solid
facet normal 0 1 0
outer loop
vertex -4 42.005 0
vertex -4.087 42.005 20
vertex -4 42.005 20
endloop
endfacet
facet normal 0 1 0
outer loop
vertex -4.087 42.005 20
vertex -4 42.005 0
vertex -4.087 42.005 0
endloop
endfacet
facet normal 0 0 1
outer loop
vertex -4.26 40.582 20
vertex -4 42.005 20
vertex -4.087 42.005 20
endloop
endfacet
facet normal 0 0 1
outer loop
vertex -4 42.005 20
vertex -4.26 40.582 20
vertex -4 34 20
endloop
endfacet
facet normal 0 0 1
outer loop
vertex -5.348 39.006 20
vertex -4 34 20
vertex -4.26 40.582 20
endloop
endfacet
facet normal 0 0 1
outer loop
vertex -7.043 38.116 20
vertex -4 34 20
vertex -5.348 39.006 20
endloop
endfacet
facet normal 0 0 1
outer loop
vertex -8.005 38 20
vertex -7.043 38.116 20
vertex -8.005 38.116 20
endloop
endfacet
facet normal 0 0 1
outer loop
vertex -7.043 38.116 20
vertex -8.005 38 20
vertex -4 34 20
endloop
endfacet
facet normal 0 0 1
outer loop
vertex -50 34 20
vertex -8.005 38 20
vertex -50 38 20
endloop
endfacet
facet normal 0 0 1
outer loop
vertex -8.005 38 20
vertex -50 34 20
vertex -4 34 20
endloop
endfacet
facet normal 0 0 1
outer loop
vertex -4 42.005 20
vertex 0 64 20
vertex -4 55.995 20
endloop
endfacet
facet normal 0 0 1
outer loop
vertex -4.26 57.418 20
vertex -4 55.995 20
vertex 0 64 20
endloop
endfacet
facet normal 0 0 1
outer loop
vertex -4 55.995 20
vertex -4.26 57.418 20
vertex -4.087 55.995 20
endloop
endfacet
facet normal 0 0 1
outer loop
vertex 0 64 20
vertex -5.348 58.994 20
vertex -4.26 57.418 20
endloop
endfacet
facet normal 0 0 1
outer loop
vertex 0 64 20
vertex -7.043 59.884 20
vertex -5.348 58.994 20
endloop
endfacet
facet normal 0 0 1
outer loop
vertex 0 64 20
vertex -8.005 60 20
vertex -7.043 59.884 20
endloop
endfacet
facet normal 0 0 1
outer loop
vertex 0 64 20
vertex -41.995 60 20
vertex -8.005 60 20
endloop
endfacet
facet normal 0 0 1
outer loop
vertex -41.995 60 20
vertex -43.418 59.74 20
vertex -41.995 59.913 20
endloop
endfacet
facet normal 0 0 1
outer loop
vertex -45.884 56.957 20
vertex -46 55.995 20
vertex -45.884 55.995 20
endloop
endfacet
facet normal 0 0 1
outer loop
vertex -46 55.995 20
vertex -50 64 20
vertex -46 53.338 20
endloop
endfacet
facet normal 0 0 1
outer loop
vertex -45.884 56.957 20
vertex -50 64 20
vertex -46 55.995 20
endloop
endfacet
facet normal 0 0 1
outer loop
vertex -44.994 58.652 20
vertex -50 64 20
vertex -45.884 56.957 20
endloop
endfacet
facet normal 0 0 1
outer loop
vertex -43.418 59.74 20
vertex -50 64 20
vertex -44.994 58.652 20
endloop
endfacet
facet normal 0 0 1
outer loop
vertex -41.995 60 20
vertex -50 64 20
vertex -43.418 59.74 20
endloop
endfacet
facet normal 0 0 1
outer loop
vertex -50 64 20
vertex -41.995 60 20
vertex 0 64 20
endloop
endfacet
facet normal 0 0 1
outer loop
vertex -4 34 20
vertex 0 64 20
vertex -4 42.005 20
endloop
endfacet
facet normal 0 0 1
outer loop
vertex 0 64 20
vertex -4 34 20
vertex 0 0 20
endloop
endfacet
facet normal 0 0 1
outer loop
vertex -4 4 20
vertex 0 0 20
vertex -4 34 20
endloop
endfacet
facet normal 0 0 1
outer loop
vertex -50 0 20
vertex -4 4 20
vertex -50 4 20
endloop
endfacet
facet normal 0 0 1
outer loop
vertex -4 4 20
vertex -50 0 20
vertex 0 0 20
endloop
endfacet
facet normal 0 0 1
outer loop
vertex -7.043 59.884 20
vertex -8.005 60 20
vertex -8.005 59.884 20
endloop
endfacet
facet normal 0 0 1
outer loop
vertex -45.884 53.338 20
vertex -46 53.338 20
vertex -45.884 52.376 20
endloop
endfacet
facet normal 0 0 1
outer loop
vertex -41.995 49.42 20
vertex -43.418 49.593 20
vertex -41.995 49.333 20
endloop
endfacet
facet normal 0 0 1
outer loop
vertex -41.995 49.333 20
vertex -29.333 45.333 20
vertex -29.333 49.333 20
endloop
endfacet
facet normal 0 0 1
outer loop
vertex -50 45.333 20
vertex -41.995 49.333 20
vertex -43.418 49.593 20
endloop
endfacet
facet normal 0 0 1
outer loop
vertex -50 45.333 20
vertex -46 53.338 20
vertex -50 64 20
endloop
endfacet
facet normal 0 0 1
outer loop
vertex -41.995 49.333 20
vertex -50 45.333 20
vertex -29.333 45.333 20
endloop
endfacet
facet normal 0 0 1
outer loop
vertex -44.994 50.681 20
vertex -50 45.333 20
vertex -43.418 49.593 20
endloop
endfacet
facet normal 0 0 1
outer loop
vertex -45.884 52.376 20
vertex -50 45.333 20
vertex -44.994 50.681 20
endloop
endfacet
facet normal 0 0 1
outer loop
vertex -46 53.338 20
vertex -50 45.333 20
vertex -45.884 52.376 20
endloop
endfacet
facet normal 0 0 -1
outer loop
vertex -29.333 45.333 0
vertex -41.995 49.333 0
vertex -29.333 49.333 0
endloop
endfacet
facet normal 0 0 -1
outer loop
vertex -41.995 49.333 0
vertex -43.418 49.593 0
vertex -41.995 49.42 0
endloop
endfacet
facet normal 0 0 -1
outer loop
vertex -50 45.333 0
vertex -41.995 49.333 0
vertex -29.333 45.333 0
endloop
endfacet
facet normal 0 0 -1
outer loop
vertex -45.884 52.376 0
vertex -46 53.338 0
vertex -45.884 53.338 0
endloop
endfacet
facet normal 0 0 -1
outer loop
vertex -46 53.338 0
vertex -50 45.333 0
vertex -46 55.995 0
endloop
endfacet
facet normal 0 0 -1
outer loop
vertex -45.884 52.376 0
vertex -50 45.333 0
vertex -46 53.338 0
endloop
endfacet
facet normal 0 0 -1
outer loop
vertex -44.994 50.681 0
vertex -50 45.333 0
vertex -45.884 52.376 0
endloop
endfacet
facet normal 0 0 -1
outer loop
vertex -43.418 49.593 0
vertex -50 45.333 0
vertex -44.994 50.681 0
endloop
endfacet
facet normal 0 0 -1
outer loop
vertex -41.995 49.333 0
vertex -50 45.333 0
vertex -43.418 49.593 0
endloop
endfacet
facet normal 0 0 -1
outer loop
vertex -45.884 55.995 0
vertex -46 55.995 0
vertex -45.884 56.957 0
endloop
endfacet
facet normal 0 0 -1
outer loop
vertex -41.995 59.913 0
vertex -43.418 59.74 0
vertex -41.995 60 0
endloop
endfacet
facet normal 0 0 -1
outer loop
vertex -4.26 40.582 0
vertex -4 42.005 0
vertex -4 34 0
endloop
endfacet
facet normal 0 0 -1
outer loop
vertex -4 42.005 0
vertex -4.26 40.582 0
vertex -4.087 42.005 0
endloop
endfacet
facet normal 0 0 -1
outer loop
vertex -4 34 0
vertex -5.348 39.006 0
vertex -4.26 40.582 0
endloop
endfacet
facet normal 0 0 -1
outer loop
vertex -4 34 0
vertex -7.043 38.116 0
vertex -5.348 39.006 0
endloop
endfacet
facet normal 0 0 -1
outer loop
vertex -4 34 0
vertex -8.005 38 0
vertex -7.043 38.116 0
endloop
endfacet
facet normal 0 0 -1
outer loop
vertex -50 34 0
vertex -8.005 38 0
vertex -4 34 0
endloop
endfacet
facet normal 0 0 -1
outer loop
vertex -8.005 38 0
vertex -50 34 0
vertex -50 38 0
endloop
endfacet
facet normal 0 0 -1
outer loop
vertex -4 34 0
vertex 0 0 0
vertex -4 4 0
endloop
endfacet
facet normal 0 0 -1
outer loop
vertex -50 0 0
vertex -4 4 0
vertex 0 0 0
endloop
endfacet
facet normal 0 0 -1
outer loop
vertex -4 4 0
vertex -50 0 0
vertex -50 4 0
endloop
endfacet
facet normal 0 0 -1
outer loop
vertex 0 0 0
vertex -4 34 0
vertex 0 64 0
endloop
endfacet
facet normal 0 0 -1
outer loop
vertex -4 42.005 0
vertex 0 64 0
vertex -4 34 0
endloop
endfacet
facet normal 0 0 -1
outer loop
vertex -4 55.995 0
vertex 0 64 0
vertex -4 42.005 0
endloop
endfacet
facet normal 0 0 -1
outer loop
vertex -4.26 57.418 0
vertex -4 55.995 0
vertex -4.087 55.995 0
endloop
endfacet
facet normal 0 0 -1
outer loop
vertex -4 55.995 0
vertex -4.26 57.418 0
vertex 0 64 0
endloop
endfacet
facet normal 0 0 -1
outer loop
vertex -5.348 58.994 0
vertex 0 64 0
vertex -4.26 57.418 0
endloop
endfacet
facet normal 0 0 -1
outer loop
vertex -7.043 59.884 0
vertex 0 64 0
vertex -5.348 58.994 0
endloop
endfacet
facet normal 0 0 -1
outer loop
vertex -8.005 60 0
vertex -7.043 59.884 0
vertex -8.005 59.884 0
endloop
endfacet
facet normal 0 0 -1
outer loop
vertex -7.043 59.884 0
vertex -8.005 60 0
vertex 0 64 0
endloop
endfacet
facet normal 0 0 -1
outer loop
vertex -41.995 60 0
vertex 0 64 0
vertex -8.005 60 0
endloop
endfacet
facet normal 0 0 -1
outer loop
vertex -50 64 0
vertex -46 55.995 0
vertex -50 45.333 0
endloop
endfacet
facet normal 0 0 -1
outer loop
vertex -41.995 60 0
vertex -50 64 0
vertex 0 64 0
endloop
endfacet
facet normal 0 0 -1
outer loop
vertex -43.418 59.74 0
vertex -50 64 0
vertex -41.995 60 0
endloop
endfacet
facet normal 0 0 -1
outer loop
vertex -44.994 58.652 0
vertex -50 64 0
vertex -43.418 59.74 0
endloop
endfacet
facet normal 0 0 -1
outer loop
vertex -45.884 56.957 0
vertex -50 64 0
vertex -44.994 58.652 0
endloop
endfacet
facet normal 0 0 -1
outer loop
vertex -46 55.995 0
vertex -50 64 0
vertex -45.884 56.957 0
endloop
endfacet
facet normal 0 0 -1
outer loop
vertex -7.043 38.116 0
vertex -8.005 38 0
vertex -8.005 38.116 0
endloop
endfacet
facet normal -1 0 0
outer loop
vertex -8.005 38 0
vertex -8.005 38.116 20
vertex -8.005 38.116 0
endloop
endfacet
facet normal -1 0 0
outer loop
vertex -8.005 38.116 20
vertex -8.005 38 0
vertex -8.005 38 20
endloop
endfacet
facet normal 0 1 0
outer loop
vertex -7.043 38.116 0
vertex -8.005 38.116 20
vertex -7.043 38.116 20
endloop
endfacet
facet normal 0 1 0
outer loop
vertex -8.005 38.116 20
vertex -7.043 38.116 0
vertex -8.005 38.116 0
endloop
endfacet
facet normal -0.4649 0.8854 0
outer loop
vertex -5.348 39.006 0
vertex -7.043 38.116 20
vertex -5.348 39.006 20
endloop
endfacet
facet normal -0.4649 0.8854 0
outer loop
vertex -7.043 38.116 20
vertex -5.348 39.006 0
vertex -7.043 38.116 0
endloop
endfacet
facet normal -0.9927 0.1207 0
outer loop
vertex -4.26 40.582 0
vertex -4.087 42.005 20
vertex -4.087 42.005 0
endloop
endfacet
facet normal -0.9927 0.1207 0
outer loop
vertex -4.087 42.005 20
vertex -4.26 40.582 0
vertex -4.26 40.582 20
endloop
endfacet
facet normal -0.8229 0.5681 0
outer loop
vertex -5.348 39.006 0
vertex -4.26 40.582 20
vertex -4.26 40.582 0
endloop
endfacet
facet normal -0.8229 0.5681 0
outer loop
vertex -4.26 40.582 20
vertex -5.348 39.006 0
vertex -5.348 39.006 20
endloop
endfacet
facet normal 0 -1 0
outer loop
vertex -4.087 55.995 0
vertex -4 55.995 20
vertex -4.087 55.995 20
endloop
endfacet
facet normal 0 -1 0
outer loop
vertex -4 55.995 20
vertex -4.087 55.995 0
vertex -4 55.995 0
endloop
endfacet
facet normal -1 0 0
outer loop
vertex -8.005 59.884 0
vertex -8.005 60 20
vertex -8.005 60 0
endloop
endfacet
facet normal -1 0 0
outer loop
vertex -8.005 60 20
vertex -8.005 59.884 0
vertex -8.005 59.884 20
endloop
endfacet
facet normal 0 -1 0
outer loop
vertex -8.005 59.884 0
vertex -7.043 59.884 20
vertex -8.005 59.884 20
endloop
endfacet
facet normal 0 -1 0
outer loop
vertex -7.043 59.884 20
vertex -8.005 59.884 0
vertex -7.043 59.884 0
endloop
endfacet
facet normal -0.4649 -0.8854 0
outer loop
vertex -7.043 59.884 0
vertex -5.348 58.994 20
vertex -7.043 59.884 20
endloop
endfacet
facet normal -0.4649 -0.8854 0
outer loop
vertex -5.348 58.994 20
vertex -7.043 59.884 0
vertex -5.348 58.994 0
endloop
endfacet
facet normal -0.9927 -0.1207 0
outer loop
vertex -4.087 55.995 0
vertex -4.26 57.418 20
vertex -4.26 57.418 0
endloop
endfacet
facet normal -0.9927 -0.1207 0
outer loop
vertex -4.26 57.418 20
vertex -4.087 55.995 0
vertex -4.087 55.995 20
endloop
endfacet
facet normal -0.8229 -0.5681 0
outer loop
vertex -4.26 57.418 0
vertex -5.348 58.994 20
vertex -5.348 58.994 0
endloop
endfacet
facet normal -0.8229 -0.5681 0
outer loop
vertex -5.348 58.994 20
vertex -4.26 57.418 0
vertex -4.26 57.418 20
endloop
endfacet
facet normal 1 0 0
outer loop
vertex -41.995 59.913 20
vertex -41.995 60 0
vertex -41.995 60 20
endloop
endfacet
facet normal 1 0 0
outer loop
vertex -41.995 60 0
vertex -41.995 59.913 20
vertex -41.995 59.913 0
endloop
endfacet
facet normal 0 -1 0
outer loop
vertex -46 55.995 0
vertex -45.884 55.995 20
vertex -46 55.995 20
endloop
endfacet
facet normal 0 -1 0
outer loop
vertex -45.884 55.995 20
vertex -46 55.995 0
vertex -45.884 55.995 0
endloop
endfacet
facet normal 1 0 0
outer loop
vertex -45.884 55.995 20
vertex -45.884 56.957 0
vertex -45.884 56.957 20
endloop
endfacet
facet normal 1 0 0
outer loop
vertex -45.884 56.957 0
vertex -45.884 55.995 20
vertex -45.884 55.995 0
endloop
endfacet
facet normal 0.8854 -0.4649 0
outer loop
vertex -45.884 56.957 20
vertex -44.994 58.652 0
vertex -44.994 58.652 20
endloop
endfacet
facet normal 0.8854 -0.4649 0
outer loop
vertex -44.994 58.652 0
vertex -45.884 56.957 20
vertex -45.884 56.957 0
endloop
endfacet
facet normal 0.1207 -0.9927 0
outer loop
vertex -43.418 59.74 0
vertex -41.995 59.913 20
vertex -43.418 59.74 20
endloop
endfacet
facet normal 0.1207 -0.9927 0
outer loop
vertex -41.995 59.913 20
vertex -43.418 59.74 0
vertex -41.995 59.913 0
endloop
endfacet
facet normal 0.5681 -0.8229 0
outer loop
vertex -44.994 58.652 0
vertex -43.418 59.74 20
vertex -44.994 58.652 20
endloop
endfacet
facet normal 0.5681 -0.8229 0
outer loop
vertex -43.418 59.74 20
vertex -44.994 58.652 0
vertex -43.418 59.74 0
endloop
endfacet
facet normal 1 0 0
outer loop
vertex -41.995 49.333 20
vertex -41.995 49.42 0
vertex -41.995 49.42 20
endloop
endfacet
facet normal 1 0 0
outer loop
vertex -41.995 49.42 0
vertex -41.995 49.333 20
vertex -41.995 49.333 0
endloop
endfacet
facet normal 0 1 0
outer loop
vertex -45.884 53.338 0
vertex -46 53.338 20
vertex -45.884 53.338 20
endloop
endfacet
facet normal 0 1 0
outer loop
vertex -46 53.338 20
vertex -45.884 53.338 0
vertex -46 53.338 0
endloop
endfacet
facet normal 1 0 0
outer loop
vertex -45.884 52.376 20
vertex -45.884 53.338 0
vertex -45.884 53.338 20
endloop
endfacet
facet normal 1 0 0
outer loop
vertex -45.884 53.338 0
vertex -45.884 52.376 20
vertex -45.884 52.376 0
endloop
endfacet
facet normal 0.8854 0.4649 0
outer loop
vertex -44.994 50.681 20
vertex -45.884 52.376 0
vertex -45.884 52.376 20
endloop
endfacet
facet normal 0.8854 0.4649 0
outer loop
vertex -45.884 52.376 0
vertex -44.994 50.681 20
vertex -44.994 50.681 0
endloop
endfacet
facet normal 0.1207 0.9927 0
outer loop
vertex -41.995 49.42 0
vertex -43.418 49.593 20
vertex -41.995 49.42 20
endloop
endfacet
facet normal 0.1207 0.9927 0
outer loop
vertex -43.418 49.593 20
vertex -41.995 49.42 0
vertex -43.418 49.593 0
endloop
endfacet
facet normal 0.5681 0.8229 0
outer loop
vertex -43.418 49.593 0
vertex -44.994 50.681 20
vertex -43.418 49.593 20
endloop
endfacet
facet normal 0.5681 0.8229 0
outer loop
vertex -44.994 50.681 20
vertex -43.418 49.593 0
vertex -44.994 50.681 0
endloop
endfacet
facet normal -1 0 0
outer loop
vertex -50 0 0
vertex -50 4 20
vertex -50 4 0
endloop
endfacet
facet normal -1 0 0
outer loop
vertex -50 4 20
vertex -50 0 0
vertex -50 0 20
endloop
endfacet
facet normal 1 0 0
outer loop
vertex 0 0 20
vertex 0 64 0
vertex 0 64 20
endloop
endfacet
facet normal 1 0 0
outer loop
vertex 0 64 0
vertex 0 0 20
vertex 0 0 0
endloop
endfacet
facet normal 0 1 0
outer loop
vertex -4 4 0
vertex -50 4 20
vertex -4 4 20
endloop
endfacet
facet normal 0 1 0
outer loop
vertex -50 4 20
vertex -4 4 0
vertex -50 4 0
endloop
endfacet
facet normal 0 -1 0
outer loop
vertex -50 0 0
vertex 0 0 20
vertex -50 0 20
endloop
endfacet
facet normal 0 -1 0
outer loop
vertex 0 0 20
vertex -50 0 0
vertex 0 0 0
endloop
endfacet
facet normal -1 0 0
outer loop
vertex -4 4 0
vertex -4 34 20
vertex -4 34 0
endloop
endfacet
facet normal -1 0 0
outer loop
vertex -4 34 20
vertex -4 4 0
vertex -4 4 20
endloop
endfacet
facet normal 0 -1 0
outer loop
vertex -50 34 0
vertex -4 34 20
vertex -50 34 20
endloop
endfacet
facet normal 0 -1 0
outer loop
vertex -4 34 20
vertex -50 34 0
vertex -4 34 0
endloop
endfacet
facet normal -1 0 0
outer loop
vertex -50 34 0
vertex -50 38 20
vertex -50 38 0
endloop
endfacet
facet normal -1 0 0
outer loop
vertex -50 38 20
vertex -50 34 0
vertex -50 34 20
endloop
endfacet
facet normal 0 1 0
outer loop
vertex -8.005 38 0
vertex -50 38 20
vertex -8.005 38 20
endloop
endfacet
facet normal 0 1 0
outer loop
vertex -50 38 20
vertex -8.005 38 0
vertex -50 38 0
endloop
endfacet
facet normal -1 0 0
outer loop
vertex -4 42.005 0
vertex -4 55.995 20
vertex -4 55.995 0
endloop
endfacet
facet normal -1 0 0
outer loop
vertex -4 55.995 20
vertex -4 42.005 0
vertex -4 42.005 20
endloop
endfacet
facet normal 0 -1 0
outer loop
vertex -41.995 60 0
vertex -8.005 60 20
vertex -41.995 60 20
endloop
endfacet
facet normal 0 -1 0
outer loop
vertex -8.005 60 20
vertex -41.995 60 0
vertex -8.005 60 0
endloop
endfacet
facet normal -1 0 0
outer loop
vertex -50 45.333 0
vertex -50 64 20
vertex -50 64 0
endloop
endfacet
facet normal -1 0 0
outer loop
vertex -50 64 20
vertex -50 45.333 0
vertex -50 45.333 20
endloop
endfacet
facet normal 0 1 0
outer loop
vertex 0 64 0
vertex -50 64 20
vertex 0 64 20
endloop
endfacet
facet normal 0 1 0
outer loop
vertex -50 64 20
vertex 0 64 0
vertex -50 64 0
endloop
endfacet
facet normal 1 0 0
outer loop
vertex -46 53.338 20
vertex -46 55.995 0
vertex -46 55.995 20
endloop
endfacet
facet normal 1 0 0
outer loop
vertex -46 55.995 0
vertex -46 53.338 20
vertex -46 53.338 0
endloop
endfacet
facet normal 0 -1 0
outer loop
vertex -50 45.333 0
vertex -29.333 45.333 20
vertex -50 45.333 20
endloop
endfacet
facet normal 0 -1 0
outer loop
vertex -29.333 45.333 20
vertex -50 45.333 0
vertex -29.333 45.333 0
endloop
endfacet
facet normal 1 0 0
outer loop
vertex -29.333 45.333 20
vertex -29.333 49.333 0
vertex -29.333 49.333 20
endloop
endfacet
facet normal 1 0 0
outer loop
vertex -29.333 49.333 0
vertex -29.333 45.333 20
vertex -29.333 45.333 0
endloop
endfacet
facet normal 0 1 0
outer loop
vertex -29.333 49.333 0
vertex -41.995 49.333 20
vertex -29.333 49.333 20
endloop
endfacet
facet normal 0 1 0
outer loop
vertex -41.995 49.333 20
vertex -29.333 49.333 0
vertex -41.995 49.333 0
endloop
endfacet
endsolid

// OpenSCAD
wallThickness = 4;
depth = 20;
supportLength = 50;
supportThickness = 30;
cavity = 22;

module fillet(r, h) {
    translate([r / 2, r / 2, 0])

        difference() {
            cube([r + 0.01, r + 0.01, h], center = true);

            translate([r/2, r/2, 0])
                cylinder(r = r, h = h + 1, center = true);

        }
}

rotate([0, -90, 0]) {
    union(){
        cube([depth, wallThickness, supportLength]);
        translate([0, wallThickness, 0]){
            cube([depth, supportThickness, wallThickness]);
        }
        translate([0, supportThickness+wallThickness, 0]){
            cube([depth, wallThickness, supportLength]);
        }
        translate([0, supportThickness+wallThickness*2, 0]){
            cube([depth, cavity, wallThickness]);
        }
        translate([depth/2, supportThickness+wallThickness*2, wallThickness]){
            rotate([90, 0, 90]){
                fillet(4, depth);
            }
        }
        translate([0, supportThickness+wallThickness*2+cavity, 0]){
            cube([depth, wallThickness, supportLength]);
        }
        translate([depth/2, supportThickness+wallThickness*2+cavity, wallThickness]){
            rotate([90, 0, -90]){
                fillet(4, depth);
            }
        }
        translate([0, supportThickness+wallThickness*2+(cavity-cavity/3*2), supportLength-wallThickness]){
            cube([depth, cavity/3*2, wallThickness]);
        }
        translate([depth/2, supportThickness+wallThickness*2+cavity, supportLength-wallThickness]){
            rotate([90, 90, 270]){
                fillet(4, depth);
            }
        }
        translate([depth/2, supportThickness+wallThickness*3+(cavity-cavity/3*2), supportLength-wallThickness]){
            rotate([90, 90, 90]){
                fillet(4, depth);
            }
        }
        translate([0, supportThickness+wallThickness*2+(cavity-cavity/3*2), supportLength-wallThickness-supportLength/3]){
            cube([depth, wallThickness, supportLength/3]);
        }
    }
}
